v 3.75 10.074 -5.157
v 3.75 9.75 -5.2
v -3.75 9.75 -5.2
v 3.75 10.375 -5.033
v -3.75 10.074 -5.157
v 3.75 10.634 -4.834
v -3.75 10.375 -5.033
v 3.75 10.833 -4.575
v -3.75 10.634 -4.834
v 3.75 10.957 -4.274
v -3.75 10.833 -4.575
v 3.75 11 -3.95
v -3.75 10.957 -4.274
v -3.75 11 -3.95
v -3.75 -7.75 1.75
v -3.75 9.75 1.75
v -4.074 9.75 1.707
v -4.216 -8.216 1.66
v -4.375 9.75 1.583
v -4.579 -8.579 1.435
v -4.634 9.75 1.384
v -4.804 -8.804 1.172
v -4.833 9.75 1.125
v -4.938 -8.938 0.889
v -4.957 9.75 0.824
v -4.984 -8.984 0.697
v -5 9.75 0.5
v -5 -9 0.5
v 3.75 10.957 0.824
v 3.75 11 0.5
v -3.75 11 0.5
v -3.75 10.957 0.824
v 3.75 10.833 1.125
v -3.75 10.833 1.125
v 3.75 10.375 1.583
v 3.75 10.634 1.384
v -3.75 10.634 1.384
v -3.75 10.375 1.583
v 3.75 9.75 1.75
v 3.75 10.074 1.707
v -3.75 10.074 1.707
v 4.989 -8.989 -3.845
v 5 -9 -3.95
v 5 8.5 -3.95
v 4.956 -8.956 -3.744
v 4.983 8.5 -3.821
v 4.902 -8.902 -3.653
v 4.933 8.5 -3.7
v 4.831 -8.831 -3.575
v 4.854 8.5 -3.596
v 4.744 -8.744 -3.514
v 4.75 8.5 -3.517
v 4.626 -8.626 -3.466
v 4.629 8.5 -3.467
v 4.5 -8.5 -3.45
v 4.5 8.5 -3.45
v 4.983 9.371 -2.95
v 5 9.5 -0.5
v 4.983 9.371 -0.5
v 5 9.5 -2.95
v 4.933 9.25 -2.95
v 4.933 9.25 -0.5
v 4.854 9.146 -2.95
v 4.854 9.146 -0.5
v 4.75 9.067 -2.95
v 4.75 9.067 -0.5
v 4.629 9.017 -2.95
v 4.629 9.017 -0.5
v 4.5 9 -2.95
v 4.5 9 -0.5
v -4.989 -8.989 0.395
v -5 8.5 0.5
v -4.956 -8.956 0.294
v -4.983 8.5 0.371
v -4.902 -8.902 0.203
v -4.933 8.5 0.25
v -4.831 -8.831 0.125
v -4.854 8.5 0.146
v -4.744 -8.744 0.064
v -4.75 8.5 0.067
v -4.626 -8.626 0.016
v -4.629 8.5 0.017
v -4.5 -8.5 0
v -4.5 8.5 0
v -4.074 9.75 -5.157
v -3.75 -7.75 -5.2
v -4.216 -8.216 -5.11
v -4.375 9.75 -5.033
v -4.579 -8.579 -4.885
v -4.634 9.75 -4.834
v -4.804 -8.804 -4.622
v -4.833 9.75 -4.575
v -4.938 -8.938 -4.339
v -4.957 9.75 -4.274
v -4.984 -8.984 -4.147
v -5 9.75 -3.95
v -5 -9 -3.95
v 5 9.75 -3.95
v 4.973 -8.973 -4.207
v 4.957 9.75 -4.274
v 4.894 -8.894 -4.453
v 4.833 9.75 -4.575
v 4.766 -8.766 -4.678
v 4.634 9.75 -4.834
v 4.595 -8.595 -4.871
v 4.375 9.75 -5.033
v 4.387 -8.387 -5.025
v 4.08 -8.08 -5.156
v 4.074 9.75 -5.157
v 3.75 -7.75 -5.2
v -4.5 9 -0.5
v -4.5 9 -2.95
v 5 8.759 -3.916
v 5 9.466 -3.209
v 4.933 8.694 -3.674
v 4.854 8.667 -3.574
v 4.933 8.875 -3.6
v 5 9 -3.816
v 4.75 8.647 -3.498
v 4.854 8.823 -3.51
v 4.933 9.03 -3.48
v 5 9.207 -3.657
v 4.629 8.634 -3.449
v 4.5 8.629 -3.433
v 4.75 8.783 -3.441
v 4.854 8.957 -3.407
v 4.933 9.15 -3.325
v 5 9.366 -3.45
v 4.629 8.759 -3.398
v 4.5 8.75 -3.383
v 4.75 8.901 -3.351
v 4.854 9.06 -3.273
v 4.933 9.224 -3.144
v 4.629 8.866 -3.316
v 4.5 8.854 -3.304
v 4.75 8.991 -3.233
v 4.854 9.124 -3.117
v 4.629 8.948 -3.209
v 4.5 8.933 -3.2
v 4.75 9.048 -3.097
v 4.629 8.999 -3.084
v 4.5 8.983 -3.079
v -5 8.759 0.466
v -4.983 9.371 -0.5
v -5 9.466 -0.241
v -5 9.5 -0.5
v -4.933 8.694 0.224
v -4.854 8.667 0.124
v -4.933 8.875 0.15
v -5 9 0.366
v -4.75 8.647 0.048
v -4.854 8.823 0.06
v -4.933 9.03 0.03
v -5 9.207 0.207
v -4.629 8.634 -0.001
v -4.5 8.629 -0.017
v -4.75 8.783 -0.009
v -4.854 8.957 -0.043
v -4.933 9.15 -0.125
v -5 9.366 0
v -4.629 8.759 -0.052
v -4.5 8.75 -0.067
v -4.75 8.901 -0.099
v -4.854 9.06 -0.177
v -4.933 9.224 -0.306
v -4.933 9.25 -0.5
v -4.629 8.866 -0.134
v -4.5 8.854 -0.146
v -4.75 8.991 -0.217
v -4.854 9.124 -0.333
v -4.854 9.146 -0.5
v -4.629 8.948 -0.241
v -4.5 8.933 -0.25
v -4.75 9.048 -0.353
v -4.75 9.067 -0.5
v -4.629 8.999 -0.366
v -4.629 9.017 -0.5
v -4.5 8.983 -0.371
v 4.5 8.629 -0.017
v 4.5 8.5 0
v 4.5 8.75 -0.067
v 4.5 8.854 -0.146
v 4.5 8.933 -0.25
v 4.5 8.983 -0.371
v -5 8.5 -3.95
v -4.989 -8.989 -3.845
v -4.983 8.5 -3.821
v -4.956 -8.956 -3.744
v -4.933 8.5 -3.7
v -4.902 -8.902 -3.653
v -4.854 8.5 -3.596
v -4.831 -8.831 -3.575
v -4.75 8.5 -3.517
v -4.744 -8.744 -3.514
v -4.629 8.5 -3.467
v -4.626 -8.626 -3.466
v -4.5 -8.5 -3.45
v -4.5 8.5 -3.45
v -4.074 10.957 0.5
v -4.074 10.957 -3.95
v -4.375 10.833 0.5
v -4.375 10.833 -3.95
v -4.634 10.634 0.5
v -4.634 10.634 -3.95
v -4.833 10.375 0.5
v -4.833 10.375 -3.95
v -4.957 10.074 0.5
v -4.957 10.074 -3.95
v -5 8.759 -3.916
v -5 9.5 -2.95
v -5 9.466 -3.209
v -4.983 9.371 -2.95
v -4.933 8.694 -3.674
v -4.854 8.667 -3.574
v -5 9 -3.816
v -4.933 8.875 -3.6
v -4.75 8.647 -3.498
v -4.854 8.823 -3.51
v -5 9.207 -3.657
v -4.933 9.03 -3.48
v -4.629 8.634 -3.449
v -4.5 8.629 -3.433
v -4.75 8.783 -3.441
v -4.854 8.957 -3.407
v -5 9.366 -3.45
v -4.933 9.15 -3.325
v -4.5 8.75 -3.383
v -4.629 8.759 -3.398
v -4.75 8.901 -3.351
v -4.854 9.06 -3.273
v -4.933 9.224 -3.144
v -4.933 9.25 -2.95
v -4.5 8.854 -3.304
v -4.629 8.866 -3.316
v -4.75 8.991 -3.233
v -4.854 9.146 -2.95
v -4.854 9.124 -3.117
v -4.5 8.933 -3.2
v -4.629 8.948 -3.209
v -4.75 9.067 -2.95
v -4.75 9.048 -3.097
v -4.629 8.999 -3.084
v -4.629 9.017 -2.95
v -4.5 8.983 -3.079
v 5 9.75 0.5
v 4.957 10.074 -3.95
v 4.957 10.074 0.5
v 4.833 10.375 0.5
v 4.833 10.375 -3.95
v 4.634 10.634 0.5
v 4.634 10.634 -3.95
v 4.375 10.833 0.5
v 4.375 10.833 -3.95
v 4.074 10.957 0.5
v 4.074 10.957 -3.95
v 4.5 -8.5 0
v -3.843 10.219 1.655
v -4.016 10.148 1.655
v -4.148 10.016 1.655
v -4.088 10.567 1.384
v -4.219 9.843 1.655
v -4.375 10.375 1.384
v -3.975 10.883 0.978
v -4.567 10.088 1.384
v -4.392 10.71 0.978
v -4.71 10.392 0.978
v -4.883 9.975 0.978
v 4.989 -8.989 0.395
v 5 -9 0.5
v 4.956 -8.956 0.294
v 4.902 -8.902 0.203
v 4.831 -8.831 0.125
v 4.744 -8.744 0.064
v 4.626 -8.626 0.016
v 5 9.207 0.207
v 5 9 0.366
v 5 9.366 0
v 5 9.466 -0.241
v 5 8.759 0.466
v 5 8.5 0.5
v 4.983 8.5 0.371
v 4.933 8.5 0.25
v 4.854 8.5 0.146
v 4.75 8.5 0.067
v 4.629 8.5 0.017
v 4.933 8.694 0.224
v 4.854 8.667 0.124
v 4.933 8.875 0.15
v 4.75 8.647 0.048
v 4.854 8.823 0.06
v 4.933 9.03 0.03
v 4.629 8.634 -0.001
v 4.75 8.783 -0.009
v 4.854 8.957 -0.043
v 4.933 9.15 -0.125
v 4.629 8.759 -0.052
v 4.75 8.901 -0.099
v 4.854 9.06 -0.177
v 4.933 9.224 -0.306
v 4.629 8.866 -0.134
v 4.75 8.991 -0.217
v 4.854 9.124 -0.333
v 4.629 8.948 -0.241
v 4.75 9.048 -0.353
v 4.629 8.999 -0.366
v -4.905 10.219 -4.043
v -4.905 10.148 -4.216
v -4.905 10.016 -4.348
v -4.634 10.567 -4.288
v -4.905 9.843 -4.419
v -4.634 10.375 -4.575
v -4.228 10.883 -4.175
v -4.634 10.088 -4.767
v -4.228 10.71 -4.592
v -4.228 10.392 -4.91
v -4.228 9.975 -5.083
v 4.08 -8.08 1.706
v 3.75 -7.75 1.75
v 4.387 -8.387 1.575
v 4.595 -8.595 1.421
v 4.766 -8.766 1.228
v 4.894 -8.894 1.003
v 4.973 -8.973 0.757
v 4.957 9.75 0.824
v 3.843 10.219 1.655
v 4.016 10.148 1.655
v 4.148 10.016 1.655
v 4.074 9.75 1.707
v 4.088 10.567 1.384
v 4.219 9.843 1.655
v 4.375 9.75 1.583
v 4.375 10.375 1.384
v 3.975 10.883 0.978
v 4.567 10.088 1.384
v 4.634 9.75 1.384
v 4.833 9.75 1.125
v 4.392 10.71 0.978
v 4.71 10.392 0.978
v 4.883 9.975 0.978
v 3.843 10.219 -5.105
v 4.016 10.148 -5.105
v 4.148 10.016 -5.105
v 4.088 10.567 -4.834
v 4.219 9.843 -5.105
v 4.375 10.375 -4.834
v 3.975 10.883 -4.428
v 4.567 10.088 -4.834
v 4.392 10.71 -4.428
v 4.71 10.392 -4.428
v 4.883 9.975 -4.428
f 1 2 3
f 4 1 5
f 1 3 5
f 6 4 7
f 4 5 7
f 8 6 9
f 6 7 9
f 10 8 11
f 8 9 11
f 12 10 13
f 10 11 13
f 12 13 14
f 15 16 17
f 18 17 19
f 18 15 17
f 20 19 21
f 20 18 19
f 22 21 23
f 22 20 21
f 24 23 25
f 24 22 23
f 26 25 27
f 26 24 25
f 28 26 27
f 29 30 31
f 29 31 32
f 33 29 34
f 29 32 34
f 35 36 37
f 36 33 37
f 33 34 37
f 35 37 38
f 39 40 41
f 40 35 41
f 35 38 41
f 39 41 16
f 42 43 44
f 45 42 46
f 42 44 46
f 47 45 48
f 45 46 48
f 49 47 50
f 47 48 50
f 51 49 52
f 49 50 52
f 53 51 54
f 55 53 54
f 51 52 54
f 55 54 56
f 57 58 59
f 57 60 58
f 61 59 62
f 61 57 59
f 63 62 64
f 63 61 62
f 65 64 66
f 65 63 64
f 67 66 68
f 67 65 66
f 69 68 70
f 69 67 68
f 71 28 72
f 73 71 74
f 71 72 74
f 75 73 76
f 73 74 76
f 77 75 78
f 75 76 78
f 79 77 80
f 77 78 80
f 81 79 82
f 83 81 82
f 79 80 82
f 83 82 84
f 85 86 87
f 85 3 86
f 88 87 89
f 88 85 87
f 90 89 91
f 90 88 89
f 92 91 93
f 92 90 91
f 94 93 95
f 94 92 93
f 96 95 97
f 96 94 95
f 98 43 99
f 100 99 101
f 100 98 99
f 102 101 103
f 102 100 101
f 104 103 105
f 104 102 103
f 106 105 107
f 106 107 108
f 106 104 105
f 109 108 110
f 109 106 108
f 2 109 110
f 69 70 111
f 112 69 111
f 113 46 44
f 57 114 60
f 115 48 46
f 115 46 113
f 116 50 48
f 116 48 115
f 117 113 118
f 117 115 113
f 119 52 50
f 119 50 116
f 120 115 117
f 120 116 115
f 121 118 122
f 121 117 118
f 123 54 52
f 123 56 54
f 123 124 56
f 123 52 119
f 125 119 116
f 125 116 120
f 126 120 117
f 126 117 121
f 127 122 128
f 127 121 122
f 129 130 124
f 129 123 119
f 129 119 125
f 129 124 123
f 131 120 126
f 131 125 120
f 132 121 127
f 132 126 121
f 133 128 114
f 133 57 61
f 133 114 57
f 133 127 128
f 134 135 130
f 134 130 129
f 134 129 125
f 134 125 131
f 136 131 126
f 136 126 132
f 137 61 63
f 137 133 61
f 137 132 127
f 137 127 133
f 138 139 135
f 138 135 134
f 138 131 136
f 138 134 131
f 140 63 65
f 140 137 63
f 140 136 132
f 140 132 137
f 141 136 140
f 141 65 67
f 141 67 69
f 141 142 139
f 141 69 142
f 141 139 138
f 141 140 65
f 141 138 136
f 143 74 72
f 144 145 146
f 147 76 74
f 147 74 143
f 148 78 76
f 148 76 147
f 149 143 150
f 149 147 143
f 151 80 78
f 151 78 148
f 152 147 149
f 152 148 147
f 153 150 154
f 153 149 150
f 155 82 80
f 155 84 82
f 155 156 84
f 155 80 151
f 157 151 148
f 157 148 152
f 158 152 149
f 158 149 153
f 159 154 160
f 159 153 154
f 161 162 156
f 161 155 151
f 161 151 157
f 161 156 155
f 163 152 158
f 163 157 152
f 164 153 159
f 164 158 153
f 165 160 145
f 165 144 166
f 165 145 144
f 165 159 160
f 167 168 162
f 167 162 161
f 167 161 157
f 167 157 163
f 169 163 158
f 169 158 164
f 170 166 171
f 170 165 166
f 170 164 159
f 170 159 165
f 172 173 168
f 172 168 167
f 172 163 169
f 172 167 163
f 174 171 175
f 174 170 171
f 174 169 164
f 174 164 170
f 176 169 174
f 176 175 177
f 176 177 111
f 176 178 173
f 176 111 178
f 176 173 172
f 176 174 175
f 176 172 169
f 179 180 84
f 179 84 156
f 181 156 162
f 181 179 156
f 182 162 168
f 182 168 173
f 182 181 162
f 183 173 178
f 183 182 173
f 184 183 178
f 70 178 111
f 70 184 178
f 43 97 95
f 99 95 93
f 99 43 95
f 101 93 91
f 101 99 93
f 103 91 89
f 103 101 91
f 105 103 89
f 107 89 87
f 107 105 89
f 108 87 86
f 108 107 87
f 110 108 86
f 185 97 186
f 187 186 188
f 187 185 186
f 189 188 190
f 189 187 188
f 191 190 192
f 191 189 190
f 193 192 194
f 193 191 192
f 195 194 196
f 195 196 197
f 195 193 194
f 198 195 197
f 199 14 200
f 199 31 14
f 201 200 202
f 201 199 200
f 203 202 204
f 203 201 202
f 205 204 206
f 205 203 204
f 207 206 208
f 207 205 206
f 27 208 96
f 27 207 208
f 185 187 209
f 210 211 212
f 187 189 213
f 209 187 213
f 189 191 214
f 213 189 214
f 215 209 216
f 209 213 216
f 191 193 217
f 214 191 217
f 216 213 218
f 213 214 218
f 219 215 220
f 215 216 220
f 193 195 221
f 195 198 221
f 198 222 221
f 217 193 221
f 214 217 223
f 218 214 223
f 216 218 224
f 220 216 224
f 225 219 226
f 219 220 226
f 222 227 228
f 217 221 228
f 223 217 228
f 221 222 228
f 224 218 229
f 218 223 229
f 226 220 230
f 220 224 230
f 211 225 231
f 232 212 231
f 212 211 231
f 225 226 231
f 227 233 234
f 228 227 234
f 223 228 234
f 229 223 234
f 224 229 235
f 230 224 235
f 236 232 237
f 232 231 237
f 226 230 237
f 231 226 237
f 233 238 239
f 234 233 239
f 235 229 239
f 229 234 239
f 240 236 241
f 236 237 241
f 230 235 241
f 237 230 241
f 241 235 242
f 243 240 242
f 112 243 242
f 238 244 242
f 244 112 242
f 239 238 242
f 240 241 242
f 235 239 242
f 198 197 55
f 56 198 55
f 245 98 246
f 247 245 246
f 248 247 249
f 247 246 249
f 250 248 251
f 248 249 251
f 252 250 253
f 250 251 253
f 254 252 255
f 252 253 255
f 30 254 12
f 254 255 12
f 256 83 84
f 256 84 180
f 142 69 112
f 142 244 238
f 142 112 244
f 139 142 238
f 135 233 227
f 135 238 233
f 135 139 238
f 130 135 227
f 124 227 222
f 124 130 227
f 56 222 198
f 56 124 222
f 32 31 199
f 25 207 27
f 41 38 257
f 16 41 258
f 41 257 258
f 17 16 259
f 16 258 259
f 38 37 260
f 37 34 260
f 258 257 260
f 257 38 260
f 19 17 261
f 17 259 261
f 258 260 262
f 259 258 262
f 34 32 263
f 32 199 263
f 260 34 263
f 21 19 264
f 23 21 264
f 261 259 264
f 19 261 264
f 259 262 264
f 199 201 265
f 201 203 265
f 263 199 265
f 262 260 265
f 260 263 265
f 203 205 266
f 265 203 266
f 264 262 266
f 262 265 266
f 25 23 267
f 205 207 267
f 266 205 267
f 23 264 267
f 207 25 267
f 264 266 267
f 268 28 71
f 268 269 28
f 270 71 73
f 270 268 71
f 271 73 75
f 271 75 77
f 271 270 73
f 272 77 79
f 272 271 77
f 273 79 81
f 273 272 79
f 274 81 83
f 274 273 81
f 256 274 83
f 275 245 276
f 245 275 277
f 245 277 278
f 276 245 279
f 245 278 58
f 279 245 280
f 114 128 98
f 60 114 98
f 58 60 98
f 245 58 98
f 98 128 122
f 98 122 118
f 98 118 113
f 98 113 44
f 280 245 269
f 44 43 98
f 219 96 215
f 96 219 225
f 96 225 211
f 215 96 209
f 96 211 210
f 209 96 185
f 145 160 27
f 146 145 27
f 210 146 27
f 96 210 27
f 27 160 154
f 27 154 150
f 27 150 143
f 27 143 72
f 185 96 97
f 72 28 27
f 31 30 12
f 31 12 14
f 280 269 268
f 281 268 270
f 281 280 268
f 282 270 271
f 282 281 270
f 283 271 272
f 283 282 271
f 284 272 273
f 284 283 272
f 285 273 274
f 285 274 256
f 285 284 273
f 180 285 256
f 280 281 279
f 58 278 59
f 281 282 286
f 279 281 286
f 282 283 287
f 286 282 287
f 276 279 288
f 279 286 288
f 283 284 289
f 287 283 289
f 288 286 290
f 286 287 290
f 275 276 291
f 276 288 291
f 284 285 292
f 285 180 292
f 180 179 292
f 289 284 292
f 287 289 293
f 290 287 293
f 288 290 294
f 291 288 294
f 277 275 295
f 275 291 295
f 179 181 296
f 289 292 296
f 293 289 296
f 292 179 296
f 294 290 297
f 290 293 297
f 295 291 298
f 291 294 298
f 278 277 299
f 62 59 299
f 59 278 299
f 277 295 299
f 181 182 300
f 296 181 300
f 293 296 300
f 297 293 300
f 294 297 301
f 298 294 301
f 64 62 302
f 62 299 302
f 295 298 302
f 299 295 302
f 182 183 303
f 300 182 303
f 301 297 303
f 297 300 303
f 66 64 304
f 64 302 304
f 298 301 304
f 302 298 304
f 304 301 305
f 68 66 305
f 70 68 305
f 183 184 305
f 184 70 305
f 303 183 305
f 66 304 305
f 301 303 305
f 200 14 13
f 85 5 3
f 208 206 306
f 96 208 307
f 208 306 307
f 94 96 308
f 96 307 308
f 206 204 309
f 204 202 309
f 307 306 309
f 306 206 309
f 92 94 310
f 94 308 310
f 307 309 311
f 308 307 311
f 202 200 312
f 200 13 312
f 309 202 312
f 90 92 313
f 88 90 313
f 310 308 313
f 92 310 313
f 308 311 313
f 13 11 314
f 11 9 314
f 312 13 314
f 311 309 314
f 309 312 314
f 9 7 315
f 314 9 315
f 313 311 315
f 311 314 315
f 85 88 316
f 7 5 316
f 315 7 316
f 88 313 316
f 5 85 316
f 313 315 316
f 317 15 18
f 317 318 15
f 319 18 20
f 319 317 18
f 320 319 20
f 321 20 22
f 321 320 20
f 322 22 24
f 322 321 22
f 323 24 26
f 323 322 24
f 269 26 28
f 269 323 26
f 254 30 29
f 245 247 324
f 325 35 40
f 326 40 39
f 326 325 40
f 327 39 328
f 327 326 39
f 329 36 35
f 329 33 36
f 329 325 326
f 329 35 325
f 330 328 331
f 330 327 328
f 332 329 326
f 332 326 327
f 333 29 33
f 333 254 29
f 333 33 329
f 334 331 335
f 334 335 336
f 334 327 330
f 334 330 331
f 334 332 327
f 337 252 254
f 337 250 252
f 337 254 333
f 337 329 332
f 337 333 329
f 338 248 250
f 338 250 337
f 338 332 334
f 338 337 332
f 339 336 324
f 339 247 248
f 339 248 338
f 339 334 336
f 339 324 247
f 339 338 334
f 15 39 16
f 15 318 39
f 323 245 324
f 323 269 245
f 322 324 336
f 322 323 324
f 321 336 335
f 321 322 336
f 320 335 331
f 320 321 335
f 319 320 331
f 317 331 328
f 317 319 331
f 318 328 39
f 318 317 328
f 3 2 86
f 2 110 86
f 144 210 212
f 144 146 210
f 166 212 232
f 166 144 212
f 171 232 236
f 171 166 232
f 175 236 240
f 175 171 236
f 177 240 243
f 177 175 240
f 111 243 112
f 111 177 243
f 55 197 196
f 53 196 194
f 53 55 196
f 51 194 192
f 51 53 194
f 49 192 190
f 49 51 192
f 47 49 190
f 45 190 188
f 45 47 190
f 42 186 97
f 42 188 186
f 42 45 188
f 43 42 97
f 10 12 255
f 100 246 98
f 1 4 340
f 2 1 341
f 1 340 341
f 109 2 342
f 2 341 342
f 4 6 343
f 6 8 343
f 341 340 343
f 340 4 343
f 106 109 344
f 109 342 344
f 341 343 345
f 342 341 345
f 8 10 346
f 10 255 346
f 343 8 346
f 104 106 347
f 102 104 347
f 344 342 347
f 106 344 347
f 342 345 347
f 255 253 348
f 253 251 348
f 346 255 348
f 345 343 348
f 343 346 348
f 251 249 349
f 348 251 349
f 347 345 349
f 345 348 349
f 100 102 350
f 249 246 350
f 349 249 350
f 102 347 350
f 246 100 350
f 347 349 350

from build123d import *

# Parameters (mm, degrees)
F0_W     = 10
F0_H     = 18
F1_DEPTH = 1.75
F2_W     = 10
F2_H     = 1.75
F2_H_2   = 5.2
F3_DEPTH = 2
F8_R     = 0.5
F9_R     = 1.24999


# Not quite as in the source:
# - a fillet or chamfer is up to 0.001 mm smaller than in the source, because OpenCascade refuses the exact size


with BuildPart() as f1:
    # F0 (on Top) → F1 (new body)
    with BuildSketch(Plane.XY):
        Rectangle(F0_W, F0_H)
    extrude(amount=F1_DEPTH)

    # F2 (on face) → F3 (join)
    with BuildSketch(Plane(origin=(0, 9, 0), x_dir=(-1, 0, 0), z_dir=(0, 1, 0))):
        with Locations((0, 0.875)):
            Rectangle(F2_W, F2_H)
        with Locations((0, -2.6)):
            Rectangle(F2_W, F2_H_2)
    extrude(amount=F3_DEPTH)

    # F7: F1 across plane


with BuildPart() as f1_1:
    add(f1.part)
    add(f1.part.mirror(Plane(origin=(-5, 1.2789499015, -1.725), x_dir=(0.9979743188, 0.063618071, 0), z_dir=(0, 0, -1))))

    # F8
    f8_edges = [f1_1.edges().sort_by_distance(p)[0] for p in [
        (0, 9, 0),
        (0, 9, -3.45),
        (5, 0, -3.45),
        (-5, 0, -3.45),
        (0, -9, -3.45),
        (5, 0, 0),
        (-5, 0, 0),
        (0, -9, 0),
        (5, 9, -1.725),
        (-5, 9, -1.725),
    ]]
    fillet(f8_edges, radius=F8_R)

    # F9 (radius 1.25 in the source; OpenCascade refuses exactly that, so slightly less here)
    f9_edges = [f1_1.edges().sort_by_distance(p)[0] for p in [
        (5, 11, -1.725),
        (0, 11, -5.2),
        (-5, 11, -1.725),
        (0, 11, 1.75),
        (5, 1, 1.75),
        (-5, 1, 1.75),
        (0, -9, 1.75),
        (-5, 1, -5.2),
        (0, -9, -5.2),
        (5, 1, -5.2),
    ]]
    fillet(f9_edges, radius=F9_R)


solid = f1_1.part
